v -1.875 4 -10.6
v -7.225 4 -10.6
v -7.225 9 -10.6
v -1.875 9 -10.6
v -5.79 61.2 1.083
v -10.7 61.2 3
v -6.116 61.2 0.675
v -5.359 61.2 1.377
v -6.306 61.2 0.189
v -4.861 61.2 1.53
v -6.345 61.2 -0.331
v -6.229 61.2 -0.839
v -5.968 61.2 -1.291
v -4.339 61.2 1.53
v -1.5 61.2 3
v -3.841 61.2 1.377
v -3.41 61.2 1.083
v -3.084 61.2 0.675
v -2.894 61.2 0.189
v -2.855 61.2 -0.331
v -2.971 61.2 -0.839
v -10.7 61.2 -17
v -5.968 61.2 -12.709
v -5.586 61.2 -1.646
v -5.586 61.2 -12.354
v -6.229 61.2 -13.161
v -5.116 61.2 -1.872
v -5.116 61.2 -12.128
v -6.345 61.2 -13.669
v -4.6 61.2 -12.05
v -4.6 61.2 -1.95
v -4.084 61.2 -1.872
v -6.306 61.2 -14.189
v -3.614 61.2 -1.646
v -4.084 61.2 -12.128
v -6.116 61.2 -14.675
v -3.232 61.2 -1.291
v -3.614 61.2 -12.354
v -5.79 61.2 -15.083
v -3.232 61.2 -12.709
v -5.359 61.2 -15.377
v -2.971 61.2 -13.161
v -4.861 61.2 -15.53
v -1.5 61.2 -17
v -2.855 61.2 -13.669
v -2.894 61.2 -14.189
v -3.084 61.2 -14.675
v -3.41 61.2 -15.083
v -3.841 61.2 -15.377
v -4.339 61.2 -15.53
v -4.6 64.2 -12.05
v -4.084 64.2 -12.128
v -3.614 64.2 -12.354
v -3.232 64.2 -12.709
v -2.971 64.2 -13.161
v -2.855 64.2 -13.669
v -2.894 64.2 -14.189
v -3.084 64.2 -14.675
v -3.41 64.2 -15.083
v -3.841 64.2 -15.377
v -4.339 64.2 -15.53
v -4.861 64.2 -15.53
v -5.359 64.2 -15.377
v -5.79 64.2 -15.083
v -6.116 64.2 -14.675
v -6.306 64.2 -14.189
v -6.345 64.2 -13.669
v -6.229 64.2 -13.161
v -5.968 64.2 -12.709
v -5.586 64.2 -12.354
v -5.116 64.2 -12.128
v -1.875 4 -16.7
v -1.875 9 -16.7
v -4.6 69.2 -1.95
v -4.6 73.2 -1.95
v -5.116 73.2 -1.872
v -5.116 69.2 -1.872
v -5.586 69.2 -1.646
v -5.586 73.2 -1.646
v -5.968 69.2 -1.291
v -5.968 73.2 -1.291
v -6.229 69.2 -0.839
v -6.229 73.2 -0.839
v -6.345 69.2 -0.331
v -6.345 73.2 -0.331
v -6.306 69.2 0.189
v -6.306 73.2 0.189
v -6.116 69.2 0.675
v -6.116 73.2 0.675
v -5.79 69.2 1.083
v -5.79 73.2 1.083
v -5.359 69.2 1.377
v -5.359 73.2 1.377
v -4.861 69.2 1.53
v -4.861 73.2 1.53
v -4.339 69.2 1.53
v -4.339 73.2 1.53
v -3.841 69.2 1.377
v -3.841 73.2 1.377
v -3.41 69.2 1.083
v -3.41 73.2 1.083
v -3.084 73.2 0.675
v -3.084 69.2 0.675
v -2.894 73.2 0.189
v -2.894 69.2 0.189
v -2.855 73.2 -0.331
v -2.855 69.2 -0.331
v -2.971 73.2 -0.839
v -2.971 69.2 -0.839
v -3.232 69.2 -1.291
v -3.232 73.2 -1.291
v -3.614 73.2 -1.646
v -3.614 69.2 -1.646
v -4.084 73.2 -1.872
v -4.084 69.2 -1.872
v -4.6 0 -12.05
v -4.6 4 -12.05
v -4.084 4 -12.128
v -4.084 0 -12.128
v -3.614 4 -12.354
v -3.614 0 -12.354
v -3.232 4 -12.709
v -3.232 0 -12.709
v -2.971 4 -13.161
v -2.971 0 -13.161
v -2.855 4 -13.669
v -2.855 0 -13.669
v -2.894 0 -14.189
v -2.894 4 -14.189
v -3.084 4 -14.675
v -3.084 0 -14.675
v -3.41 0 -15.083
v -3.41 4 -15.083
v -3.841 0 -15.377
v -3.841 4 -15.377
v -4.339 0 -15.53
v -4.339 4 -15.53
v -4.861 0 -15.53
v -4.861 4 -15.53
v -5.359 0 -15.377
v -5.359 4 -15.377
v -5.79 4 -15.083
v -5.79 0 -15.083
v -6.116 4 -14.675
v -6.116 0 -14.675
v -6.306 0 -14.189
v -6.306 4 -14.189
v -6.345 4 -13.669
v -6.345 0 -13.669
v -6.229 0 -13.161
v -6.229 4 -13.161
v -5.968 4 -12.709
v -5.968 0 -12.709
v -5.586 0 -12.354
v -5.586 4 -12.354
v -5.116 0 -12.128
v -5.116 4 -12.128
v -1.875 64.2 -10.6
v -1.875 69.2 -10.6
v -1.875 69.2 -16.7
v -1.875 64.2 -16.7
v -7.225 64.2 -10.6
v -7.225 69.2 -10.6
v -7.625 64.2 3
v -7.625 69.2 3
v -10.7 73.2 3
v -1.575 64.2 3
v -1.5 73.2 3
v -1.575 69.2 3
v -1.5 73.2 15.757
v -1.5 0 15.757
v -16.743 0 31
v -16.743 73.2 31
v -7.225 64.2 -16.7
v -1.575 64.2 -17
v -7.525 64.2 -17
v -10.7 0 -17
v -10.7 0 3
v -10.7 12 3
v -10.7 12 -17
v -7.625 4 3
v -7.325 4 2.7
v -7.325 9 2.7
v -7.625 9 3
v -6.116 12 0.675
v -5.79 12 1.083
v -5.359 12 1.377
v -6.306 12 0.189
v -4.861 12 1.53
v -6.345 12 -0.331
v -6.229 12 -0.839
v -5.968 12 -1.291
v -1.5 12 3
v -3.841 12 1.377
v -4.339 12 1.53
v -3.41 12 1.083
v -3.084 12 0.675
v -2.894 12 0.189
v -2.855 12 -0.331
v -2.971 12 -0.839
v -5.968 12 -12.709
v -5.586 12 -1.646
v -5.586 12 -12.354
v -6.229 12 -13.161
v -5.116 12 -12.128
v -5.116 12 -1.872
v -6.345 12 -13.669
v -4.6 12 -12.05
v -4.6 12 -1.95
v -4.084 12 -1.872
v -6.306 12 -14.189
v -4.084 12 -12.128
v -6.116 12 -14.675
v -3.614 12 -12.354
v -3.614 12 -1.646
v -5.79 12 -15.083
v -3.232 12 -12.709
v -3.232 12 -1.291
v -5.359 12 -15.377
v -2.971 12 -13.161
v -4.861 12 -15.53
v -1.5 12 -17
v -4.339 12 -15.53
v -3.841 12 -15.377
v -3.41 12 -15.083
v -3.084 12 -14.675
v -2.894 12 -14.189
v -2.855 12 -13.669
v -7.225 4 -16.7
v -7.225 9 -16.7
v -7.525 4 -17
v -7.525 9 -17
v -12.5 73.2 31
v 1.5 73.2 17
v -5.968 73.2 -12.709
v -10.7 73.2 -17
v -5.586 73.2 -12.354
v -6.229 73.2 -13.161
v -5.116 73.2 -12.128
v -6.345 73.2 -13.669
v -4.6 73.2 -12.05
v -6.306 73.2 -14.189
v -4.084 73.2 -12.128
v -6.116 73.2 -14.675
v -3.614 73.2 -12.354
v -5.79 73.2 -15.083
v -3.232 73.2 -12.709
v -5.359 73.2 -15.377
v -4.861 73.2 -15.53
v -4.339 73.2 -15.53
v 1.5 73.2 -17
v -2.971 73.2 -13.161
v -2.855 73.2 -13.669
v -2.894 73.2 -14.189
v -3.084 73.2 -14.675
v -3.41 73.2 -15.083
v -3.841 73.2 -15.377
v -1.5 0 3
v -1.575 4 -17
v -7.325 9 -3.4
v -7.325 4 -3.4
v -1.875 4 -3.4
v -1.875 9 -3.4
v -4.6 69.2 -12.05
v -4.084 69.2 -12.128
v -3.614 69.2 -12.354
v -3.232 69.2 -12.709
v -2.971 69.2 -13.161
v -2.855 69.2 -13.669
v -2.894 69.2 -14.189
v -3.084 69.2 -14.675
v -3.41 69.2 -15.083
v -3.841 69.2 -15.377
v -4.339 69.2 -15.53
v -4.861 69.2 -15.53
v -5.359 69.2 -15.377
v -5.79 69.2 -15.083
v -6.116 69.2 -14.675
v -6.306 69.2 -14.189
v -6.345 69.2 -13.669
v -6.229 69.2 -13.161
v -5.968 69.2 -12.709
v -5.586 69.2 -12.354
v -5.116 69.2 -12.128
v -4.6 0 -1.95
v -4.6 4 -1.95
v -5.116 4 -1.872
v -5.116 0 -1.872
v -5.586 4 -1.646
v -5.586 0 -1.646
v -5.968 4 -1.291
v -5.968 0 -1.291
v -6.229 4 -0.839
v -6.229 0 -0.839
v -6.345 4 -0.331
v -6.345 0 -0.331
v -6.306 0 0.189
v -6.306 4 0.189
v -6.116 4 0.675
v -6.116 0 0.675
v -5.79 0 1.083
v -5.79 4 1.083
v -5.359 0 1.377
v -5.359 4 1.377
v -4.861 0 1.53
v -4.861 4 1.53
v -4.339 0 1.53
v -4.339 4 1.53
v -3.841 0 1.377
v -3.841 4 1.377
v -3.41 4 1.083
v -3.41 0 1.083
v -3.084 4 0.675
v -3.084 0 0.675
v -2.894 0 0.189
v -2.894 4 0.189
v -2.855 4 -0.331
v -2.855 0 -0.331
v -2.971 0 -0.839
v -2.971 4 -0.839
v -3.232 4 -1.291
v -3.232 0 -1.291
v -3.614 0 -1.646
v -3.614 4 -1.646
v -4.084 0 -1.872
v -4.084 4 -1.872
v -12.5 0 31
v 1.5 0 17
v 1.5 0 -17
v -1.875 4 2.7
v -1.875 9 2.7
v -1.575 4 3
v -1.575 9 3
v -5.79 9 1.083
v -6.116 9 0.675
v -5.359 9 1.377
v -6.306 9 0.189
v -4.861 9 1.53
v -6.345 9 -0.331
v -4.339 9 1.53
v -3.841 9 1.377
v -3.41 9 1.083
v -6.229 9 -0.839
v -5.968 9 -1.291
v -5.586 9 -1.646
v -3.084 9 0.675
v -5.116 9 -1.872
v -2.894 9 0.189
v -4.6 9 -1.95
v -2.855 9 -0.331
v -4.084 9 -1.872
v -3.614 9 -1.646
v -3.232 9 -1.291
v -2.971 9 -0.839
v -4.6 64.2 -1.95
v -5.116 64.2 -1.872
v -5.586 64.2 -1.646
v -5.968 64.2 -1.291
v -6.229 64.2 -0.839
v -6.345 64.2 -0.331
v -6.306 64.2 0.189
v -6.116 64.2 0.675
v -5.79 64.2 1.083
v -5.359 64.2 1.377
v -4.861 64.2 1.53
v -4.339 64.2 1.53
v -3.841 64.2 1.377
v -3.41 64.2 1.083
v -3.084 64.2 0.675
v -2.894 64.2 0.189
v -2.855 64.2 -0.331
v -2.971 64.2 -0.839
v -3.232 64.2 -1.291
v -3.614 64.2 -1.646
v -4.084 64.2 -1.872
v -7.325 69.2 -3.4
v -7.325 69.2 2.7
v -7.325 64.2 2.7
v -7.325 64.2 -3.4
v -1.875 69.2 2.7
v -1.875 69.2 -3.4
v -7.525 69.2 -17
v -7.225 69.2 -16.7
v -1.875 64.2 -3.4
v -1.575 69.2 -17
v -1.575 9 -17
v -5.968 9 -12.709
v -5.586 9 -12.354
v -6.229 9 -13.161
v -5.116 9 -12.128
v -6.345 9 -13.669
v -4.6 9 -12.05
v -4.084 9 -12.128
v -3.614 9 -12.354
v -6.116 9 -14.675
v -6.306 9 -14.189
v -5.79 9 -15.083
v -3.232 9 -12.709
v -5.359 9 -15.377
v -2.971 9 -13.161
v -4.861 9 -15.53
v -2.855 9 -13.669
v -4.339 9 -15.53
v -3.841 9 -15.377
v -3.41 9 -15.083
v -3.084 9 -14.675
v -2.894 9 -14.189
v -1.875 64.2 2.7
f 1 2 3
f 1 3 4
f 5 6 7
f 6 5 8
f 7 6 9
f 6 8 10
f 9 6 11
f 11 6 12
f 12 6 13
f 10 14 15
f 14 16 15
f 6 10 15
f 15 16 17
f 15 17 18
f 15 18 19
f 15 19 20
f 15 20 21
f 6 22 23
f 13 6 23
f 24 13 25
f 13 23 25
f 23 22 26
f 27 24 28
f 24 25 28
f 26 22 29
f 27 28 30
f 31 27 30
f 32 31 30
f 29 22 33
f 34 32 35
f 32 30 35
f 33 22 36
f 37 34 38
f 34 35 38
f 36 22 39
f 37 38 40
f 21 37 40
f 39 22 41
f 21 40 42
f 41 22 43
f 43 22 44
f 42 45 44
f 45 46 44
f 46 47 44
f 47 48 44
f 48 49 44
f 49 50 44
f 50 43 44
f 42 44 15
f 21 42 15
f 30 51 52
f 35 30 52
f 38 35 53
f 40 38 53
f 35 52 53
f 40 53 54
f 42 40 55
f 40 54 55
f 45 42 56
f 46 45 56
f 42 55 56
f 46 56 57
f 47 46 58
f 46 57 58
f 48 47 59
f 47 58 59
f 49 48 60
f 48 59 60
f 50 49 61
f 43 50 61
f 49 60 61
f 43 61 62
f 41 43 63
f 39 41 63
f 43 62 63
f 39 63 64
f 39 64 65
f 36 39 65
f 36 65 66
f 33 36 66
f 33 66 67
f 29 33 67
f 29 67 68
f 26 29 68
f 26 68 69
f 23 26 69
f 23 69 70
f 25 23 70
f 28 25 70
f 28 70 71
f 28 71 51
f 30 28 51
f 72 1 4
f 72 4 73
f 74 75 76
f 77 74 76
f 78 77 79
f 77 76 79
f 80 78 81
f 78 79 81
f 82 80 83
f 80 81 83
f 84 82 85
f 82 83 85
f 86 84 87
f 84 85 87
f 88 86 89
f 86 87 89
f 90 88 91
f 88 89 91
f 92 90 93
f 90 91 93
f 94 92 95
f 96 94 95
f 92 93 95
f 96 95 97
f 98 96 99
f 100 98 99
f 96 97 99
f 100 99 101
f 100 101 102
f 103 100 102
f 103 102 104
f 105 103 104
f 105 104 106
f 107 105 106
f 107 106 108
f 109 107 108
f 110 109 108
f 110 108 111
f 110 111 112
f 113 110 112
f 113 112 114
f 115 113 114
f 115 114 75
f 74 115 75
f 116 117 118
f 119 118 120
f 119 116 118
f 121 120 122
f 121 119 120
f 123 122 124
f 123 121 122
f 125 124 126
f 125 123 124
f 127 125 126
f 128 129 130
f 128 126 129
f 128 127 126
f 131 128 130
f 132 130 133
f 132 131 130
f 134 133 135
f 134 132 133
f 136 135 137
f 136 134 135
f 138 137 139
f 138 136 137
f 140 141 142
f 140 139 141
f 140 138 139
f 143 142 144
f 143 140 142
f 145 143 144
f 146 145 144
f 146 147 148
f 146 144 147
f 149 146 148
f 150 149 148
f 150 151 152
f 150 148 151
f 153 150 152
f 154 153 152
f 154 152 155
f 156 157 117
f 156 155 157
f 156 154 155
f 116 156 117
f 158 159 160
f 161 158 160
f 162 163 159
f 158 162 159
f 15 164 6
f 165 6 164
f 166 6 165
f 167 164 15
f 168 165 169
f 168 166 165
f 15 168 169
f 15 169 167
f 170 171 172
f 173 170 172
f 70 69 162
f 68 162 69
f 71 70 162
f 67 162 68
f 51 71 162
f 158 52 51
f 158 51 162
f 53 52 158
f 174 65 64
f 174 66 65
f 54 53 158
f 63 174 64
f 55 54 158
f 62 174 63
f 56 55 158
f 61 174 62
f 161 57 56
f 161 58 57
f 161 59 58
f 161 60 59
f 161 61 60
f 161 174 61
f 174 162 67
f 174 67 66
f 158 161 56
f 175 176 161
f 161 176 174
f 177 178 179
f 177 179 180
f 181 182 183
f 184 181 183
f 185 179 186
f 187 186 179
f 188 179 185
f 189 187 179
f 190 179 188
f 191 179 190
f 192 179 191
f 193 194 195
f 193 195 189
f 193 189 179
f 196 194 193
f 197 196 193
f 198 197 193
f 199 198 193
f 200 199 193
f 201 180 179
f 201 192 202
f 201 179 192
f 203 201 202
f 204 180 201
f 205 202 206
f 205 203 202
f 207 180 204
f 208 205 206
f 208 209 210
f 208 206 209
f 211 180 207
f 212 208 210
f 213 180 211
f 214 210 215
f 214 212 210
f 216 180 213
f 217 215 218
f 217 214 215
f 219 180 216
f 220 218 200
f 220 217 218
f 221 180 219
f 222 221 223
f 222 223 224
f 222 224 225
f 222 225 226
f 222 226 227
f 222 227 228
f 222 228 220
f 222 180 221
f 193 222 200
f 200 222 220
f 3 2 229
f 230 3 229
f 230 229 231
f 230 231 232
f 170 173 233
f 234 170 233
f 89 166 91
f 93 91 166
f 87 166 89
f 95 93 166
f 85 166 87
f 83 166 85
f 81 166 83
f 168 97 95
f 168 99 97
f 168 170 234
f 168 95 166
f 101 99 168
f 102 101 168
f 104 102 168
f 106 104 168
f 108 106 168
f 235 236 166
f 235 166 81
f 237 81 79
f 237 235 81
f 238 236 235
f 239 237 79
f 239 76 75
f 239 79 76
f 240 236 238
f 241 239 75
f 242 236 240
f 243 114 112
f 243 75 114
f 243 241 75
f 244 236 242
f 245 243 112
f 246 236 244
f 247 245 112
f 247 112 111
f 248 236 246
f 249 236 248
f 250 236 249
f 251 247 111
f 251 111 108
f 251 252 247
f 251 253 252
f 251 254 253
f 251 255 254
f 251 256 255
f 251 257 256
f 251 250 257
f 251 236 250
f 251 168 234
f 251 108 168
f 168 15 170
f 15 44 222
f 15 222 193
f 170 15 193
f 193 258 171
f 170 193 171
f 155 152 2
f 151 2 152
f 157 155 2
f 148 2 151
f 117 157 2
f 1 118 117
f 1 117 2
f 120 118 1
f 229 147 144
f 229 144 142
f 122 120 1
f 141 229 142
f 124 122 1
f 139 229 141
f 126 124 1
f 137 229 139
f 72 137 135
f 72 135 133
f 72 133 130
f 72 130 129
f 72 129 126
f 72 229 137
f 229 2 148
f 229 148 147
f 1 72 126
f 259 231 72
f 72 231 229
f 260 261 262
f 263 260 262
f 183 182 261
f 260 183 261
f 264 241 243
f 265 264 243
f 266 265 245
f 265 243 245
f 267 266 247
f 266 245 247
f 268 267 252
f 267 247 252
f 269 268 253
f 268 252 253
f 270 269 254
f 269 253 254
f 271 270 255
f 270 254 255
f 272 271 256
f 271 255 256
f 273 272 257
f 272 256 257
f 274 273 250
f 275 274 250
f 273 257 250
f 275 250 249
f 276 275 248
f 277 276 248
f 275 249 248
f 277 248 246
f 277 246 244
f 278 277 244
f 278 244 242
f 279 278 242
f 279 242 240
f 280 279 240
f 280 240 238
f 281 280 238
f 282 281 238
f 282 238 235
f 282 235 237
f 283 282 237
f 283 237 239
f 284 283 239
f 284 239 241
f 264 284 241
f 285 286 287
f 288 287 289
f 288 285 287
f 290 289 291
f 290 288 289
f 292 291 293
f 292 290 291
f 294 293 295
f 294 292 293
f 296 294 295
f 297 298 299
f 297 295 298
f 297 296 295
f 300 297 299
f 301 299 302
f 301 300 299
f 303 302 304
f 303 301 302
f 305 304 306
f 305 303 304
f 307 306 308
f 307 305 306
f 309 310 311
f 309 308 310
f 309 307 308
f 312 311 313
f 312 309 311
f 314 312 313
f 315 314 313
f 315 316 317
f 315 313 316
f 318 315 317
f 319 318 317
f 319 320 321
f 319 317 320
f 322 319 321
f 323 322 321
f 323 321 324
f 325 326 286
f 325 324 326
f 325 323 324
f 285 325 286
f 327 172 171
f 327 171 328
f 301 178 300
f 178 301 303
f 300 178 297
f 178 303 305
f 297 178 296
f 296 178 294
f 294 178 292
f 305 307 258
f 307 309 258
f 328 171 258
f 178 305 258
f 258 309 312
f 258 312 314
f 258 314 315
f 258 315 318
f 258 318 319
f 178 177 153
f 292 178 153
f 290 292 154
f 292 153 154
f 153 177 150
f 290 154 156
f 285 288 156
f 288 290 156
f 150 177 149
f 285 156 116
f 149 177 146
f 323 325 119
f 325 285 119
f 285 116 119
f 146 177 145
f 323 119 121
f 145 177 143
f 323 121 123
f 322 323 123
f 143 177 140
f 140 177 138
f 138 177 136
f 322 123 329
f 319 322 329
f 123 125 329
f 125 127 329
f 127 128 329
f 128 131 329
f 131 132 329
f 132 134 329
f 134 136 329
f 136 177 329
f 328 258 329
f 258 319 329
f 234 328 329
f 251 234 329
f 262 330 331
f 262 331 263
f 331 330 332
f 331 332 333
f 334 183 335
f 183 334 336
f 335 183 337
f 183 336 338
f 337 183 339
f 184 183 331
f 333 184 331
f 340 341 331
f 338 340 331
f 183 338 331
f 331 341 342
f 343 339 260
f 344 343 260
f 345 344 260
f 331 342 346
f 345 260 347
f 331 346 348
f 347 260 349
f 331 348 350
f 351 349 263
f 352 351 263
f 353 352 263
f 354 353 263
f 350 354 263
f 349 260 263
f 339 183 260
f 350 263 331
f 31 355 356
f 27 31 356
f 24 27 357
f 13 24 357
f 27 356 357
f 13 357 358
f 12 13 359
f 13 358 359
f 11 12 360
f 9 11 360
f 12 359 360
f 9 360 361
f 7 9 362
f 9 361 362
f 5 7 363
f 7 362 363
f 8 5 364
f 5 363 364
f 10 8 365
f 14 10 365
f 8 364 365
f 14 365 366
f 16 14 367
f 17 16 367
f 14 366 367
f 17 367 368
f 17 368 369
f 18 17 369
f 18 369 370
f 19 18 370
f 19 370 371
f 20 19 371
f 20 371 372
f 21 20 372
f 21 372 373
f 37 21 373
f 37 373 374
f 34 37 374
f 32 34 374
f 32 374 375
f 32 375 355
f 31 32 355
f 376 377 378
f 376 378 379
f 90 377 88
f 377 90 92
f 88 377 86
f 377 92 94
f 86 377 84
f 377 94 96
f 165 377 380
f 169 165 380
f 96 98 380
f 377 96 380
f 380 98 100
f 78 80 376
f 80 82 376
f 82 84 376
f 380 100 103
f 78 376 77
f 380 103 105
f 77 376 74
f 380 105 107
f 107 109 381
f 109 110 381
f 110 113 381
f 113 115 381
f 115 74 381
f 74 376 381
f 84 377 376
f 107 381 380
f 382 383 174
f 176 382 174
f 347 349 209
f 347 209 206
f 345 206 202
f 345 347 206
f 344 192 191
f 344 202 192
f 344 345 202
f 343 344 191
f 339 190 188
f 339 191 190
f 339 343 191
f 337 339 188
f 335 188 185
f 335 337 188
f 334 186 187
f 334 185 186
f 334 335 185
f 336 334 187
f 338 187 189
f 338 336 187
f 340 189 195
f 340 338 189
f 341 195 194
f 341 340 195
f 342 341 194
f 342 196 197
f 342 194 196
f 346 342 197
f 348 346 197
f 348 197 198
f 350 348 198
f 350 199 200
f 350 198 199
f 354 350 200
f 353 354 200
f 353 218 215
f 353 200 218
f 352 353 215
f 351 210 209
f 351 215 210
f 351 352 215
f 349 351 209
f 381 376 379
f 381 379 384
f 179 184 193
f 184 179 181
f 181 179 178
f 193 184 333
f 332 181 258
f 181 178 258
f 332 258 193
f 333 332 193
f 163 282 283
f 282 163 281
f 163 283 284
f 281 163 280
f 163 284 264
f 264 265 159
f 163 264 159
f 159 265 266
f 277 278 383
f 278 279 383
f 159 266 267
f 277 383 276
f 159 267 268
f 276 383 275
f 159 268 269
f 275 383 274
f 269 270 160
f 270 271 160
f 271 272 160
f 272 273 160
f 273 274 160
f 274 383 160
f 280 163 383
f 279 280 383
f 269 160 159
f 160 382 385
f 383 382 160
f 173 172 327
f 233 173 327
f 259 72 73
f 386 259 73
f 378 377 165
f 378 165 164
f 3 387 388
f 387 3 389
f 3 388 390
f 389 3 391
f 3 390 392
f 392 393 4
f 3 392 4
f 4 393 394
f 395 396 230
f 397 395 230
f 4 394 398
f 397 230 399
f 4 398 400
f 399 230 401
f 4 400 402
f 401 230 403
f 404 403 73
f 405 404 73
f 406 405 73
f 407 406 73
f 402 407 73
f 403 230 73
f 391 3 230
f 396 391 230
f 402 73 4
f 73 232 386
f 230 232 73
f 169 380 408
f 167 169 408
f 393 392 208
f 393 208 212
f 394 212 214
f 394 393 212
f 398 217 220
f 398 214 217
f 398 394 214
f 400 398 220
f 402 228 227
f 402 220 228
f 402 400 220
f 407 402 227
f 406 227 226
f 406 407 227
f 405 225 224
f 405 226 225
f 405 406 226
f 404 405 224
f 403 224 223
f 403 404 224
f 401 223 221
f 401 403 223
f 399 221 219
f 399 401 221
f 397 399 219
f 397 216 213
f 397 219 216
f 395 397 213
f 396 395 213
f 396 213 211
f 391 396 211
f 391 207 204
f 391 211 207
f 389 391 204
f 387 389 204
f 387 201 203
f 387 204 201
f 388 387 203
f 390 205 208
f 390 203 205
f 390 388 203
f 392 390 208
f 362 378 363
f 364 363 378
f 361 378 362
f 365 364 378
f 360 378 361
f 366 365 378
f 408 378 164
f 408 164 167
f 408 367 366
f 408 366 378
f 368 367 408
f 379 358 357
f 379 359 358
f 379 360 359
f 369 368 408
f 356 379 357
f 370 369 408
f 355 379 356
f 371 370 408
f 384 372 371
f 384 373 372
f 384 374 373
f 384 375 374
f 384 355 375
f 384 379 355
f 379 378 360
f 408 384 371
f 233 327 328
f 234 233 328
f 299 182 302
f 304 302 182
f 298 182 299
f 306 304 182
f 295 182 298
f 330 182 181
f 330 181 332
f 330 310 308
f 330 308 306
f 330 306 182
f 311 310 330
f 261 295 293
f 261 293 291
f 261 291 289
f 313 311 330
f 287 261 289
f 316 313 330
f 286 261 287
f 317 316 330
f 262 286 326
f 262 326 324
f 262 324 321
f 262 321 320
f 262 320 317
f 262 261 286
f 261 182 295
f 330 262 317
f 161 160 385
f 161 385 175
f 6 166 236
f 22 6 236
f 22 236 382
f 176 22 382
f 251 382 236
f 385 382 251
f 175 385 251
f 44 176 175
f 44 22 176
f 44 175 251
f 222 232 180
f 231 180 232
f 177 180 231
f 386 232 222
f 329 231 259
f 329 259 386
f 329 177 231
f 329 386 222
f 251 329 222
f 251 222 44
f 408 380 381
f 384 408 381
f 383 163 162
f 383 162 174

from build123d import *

# Parameters (mm, degrees)
EXTRUDE_1_DEPTH     = 73.2
SKETCH_2_W          = 9.2
SKETCH_2_H          = 20
EXTRUDE_2_DEPTH     = 12
SKETCH_4_R          = 1.75
CUT_EXTRUDE_1_DEPTH = 20
SKETCH_7_W          = 5.45
SKETCH_7_H          = 6.4
SKETCH_7_W_2        = 5.35
CUT_EXTRUDE_2_DEPTH = 5
CHAMFER_1_SIZE      = 0.3


with BuildPart() as part:
    # 草图1 → 凸台-拉伸1 (new body)
    with BuildSketch(Plane(origin=(0, 0, 0), x_dir=(1, 0, 0), z_dir=(0, 1, 0))):
        Polygon((-12.5, -31), (1.5, -17), (1.5, 17), (-1.5, 17), (-1.5, -15.757359313), (-16.742640687, -31), align=None)
    extrude(amount=EXTRUDE_1_DEPTH)

    # 草图2 → 凸台-拉伸2 (add)
    with BuildSketch(Plane(origin=(0, 73.2, 0), x_dir=(1, 0, 0), z_dir=(0, 1, 0))):
        with Locations((-6.1, 7)):
            Rectangle(SKETCH_2_W, SKETCH_2_H)
    extrude_2 = extrude(amount=-EXTRUDE_2_DEPTH)

    # 草图4 → 切除-拉伸1 (cut)
    with BuildSketch(Plane(origin=(0, 73.2, 0), x_dir=(1, 0, 0), z_dir=(0, 1, 0))):
        with Locations(Location((-4.6, 13.8, 0), (0, 0, 270))):
            Circle(SKETCH_4_R)
        with Locations(Location((-4.6, 0.2, 0), (0, 0, 90))):
            Circle(SKETCH_4_R)
    cut_extrude_1 = extrude(amount=-CUT_EXTRUDE_1_DEPTH, mode=Mode.SUBTRACT)

    # 草图7 → 切除-拉伸2 (cut)
    with BuildSketch(Plane(origin=(0, 69.2, 0), x_dir=(1, 0, 0), z_dir=(0, 1, 0))):
        with Locations((-4.6, 0.2)):
            Rectangle(SKETCH_7_W, SKETCH_7_H)
        with Locations((-4.55, 13.8)):
            Rectangle(SKETCH_7_W_2, SKETCH_7_H)
    cut_extrude_2 = extrude(amount=-CUT_EXTRUDE_2_DEPTH, mode=Mode.SUBTRACT)

    # 镜向1: 凸台-拉伸2, 切除-拉伸1, 切除-拉伸2 across plane
    add(extrude_2.mirror(Plane.ZX.offset(36.6)))
    add(cut_extrude_1.mirror(Plane.ZX.offset(36.6)), mode=Mode.SUBTRACT)
    add(cut_extrude_2.mirror(Plane.ZX.offset(36.6)), mode=Mode.SUBTRACT)

    # 倒角1
    chamfer_1_edges = [part.edges().sort_by_distance(p)[0] for p in [
        (-7.325, 6.5, 3),
        (-1.875, 6.5, 3),
        (-7.225, 6.5, -17),
        (-1.875, 6.5, -17),
        (-7.325, 66.7, 3),
        (-1.875, 66.7, 3),
        (-7.225, 66.7, -17),
        (-1.875, 66.7, -17),
    ]]
    chamfer(chamfer_1_edges, length=CHAMFER_1_SIZE)


solid = part.part
